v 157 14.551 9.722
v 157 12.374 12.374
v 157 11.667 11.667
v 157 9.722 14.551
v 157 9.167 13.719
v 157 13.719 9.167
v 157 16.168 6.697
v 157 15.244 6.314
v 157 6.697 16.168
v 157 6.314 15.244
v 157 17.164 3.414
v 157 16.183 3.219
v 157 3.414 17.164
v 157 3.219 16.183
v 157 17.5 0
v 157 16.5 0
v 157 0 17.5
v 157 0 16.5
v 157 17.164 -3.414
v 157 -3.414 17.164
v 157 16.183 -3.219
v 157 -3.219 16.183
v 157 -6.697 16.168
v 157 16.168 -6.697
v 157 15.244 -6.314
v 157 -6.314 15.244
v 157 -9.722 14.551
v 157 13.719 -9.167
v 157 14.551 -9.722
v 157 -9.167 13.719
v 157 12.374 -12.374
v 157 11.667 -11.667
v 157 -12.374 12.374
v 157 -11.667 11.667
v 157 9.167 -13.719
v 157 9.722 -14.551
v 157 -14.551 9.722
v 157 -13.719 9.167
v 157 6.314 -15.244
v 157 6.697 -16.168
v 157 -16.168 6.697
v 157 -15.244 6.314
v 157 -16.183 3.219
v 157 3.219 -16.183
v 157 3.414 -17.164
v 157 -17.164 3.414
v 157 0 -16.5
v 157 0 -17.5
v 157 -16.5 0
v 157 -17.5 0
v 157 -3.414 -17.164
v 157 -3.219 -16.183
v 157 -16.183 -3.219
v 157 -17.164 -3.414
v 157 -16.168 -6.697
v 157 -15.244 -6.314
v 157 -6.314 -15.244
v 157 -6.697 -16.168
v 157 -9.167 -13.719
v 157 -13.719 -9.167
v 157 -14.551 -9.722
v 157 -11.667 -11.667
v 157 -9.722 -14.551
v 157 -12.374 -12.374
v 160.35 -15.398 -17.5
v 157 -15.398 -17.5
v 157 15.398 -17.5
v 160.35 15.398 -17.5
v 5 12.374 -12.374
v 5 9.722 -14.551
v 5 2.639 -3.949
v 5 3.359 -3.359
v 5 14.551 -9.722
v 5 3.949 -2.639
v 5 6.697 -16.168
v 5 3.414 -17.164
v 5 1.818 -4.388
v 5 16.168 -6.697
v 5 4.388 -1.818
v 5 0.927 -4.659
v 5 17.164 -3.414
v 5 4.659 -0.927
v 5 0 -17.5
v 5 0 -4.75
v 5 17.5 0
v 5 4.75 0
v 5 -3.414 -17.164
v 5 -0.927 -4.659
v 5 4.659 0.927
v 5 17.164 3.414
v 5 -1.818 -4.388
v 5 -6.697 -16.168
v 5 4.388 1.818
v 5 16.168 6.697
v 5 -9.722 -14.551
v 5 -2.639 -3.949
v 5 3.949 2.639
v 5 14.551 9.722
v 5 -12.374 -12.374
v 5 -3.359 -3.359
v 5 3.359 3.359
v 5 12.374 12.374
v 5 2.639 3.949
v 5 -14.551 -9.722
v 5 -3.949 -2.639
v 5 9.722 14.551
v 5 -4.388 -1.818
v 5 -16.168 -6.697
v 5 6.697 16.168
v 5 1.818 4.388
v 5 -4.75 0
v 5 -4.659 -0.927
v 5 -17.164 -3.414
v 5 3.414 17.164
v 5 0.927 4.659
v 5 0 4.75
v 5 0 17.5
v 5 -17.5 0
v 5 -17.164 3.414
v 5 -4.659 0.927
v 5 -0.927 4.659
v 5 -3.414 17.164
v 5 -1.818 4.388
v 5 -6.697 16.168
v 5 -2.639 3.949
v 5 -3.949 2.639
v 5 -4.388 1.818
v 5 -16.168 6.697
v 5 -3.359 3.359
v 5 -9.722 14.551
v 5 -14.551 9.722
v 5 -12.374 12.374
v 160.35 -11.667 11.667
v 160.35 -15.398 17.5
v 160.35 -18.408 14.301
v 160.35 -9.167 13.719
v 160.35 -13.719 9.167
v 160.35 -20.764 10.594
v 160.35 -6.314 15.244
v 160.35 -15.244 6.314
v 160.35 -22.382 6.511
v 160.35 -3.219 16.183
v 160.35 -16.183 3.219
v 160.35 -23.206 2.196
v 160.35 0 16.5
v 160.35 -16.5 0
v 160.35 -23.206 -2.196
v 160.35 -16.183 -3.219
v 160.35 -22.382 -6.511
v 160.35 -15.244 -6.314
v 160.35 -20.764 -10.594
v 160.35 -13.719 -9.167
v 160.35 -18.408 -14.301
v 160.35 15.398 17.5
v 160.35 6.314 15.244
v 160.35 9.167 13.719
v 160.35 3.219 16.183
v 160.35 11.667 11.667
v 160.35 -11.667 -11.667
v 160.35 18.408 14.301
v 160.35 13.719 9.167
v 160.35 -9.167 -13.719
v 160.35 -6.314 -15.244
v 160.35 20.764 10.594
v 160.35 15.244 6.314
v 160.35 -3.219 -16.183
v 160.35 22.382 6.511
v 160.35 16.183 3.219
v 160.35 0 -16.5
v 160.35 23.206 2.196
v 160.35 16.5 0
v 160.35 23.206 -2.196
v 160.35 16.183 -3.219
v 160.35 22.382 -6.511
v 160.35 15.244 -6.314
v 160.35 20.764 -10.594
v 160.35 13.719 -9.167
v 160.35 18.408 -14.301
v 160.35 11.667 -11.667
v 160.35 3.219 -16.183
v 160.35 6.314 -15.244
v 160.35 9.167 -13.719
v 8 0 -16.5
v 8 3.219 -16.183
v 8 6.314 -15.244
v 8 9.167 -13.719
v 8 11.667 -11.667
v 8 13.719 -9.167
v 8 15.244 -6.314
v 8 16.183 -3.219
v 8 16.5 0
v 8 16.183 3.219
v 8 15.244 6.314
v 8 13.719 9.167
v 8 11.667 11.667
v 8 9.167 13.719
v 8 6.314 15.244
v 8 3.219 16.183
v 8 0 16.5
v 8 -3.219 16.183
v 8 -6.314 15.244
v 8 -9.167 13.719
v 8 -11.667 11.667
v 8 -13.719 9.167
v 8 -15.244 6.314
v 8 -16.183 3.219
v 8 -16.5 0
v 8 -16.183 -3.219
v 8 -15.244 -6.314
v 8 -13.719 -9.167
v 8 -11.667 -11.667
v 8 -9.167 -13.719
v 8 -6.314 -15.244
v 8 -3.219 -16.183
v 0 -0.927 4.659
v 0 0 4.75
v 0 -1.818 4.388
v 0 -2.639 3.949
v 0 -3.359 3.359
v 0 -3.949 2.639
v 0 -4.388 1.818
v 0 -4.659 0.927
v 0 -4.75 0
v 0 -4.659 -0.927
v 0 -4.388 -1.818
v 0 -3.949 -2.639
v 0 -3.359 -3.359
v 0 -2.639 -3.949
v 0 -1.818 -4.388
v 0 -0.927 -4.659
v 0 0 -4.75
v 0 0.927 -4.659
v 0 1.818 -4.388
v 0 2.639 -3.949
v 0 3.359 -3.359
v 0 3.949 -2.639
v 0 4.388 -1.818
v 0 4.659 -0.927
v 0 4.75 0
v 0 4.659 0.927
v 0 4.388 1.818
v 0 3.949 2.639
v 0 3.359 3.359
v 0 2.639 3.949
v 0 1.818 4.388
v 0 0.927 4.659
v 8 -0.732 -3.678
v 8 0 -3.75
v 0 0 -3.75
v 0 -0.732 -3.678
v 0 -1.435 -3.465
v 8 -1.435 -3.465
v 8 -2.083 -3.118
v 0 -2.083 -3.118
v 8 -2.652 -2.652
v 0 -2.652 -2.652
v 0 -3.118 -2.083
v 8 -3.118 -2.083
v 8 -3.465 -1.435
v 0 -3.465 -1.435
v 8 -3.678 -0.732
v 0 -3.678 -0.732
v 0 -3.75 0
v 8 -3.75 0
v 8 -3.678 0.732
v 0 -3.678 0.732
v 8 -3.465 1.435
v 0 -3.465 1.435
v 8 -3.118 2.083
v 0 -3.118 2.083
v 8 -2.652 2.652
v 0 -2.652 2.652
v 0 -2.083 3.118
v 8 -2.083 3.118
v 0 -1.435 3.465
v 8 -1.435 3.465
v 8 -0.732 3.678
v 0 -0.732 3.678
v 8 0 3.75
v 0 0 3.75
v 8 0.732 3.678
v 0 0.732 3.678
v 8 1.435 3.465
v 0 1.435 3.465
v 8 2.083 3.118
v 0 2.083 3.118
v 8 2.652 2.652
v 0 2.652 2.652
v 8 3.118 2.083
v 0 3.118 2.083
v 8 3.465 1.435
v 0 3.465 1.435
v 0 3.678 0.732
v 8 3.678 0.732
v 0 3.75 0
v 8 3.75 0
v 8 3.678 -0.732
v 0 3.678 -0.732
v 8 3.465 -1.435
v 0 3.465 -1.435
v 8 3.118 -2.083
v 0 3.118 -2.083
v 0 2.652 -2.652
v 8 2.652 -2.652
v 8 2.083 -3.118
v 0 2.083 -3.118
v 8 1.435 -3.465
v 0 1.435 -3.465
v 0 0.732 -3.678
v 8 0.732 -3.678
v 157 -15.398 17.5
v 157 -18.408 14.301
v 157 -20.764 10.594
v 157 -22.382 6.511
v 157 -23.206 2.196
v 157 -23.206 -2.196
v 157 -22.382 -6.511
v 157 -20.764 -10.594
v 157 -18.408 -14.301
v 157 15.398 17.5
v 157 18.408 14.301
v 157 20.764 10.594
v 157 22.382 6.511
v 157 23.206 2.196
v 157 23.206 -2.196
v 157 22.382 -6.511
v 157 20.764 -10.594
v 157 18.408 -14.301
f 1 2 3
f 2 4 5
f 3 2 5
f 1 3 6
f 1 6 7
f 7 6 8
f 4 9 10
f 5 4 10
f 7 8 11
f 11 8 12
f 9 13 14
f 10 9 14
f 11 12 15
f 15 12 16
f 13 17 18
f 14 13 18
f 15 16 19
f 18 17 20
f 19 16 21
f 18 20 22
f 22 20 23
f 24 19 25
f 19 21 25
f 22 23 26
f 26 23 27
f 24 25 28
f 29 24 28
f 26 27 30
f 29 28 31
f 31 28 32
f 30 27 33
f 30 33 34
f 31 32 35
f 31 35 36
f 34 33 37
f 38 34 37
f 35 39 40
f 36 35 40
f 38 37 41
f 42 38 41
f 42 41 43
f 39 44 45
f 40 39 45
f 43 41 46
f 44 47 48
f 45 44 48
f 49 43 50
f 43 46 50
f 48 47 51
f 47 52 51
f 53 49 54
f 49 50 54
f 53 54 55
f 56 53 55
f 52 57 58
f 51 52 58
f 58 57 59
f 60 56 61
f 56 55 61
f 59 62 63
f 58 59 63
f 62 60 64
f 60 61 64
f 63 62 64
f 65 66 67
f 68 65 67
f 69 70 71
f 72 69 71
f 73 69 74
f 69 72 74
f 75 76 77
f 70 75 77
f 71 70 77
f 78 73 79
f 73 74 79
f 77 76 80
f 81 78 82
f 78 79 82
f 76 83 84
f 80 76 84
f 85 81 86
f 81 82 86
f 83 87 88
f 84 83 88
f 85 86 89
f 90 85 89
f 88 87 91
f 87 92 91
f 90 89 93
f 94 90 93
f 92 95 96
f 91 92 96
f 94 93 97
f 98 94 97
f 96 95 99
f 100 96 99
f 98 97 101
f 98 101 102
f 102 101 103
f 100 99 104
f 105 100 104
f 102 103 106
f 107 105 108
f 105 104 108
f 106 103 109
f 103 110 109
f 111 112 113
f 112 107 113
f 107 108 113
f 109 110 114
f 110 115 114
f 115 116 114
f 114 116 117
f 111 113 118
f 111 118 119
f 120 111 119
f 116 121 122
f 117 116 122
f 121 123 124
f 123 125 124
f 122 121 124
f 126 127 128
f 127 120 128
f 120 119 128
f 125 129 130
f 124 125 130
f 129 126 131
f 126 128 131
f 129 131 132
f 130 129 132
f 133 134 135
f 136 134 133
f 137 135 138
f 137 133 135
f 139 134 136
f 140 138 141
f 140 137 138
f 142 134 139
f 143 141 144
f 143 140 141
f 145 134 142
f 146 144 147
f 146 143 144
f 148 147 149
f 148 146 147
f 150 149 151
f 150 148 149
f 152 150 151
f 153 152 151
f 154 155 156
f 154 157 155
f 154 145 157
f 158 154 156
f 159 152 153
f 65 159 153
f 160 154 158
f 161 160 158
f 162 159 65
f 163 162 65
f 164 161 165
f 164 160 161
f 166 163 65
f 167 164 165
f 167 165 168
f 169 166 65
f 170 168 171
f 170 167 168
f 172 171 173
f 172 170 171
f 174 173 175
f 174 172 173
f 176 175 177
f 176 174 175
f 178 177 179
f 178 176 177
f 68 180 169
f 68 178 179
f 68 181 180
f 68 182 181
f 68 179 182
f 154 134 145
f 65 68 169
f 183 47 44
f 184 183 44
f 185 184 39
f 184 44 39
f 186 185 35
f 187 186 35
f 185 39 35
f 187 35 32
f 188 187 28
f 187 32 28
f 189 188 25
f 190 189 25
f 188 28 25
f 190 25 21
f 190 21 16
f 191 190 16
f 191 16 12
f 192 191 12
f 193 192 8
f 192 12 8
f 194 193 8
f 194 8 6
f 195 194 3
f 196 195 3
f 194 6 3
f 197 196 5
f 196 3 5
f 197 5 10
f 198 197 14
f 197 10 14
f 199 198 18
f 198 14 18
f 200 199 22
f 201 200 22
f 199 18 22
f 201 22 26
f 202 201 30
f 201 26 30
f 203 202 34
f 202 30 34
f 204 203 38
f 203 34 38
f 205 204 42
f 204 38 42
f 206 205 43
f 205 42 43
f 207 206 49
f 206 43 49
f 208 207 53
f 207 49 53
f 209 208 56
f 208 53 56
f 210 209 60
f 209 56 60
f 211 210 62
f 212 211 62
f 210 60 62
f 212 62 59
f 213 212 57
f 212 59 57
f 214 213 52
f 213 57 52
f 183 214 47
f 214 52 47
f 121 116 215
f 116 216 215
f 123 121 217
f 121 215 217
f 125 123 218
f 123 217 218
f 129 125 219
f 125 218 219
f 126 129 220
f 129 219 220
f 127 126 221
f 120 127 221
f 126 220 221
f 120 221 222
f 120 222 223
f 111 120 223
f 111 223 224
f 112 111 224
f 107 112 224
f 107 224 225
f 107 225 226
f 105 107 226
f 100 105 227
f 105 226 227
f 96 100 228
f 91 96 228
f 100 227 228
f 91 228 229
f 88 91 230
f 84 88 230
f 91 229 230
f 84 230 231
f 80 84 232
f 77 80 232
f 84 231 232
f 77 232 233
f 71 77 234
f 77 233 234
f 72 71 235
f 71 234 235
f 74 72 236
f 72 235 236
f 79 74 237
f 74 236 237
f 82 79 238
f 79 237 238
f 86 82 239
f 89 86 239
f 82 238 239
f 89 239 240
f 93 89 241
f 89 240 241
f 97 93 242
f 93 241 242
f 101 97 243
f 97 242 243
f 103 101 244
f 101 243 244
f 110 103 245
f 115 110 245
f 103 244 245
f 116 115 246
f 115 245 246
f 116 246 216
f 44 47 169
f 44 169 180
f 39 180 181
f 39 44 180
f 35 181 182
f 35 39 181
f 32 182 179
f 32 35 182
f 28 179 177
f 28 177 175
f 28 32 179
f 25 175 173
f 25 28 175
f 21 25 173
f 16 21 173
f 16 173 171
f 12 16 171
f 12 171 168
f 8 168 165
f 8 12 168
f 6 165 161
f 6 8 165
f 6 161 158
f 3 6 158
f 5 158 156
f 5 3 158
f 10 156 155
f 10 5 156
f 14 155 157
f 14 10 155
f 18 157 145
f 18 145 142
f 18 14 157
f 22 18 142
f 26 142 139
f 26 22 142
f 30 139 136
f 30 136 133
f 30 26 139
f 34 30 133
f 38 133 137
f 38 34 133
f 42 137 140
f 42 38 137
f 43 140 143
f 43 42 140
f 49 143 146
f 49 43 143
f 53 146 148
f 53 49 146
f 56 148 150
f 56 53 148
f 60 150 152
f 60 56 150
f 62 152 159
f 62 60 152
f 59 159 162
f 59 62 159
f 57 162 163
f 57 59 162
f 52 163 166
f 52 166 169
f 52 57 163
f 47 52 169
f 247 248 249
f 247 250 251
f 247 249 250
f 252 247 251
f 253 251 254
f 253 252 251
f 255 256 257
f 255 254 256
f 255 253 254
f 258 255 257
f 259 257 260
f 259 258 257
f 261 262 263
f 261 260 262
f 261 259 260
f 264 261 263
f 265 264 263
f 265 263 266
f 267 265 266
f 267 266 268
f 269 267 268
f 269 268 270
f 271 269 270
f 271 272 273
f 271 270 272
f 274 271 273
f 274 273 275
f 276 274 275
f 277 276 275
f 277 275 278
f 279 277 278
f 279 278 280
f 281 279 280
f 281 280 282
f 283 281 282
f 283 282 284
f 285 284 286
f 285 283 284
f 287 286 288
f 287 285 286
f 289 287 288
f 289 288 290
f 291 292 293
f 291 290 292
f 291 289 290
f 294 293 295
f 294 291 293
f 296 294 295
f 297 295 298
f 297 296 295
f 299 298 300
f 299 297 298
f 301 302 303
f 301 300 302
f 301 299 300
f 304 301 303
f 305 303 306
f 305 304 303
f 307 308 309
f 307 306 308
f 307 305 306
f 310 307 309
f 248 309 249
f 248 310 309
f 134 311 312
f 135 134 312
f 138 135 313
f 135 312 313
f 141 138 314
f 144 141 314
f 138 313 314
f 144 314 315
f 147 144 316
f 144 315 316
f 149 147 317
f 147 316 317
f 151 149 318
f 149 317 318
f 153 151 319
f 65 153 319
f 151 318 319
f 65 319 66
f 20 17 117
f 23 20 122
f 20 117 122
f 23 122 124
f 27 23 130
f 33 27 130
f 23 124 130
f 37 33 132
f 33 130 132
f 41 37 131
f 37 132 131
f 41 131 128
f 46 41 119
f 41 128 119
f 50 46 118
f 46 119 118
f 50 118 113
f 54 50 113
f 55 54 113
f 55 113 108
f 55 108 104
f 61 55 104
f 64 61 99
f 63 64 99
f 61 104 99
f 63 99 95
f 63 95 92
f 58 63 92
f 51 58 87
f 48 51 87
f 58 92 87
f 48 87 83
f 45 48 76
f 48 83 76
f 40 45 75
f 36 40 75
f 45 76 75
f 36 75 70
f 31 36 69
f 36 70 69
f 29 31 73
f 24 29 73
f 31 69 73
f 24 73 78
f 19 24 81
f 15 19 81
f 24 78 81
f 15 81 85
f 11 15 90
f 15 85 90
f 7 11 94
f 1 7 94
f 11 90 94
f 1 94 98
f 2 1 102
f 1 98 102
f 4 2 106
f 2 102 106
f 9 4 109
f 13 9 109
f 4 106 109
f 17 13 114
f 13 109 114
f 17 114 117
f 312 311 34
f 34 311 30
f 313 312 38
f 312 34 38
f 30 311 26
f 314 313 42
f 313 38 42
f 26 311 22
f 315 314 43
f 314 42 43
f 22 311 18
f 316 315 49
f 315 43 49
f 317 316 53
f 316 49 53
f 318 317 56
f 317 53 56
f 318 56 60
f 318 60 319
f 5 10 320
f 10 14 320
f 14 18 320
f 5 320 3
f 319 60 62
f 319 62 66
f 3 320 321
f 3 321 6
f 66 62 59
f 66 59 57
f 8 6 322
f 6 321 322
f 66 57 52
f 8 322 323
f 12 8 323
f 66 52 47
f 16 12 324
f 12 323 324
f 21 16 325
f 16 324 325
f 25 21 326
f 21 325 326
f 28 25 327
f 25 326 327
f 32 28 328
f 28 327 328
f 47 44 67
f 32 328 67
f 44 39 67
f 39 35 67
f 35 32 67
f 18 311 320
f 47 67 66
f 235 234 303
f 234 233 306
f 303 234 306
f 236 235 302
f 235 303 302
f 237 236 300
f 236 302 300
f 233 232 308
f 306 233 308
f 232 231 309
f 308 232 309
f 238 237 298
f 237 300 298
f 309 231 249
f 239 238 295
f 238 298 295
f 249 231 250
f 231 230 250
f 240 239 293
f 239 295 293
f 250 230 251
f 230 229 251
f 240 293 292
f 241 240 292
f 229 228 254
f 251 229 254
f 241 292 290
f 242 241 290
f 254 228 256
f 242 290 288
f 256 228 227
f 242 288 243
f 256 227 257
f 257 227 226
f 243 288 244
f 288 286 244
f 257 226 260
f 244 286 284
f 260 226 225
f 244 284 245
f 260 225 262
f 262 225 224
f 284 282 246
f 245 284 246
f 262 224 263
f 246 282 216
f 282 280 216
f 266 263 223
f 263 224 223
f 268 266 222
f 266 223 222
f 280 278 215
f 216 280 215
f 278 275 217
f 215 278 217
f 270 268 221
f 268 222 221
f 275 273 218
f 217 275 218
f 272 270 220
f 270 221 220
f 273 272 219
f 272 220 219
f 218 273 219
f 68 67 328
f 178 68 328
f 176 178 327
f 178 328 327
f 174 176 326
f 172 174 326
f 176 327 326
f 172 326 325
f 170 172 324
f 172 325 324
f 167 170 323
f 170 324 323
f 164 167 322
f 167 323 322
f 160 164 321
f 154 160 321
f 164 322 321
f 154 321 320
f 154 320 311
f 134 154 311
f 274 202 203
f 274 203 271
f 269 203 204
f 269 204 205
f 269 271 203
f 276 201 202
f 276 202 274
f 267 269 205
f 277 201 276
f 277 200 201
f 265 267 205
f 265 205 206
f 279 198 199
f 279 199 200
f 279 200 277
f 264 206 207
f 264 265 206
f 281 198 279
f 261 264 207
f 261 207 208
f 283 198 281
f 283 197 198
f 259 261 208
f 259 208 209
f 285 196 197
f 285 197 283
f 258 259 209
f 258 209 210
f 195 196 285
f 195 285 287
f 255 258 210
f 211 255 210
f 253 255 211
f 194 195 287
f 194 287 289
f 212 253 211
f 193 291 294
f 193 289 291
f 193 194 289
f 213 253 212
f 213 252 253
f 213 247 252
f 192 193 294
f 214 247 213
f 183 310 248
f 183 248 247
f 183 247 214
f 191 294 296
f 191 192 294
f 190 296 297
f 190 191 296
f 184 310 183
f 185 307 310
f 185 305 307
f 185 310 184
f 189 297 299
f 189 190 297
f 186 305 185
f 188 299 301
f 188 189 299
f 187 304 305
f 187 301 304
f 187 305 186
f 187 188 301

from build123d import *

# Parameters (mm, degrees)
CUT_EXTRUDE1_DEPTH      = 45
CUT_EXTRUDE1_DEPTH_BACK = 260
SKETCH2_R               = 3.75
SKETCH3_R               = 16.5
CUT_EXTRUDE2_DEPTH      = 149
SKETCH4_R               = 16.5
BOSS_EXTRUDE1_DEPTH     = 3.35


with BuildPart() as part:
    # Sketch1 → Revolve2 (revolve)
    with BuildSketch(Plane.XY, mode=Mode.PRIVATE) as revolve2_sk:
        Polygon((0, 0), (157, 0), (157, 17.5), (5, 17.5), (5, 4.75), (0, 4.75), align=None)
    revolve(revolve2_sk.sketch.rotate(Axis((0, 0, 0), (1, 0, 0)), 90), axis=Axis((0, 0, 0), (1, 0, 0)))

    # Sketch2 → Cut-Extrude1 (cut, two sides: drawn at the far end of the back side and taken through both)
    with BuildSketch(Plane.ZY.offset(-CUT_EXTRUDE1_DEPTH_BACK)):
        with Locations(Location((0, 0, 0), (0, 0, 180))):
            Circle(SKETCH2_R)
    extrude(amount=CUT_EXTRUDE1_DEPTH + CUT_EXTRUDE1_DEPTH_BACK, mode=Mode.SUBTRACT)

    # Sketch3 → Cut-Extrude2 (cut)
    with BuildSketch(Plane(origin=(157, 0, 0), x_dir=(0, 0, -1), z_dir=(1, 0, 0))):
        Circle(SKETCH3_R)
    extrude(amount=-CUT_EXTRUDE2_DEPTH, mode=Mode.SUBTRACT)


with BuildPart() as body_2:
    # Sketch4 → Boss-Extrude1 (new body)
    with BuildSketch(Plane(origin=(157, 0, 0), x_dir=(0, 0, -1), z_dir=(1, 0, 0))):
        with BuildLine():
            Line((-17.5, 15.398249901), (-17.5, -15.398249901))
            ThreePointArc((-17.5, -15.398249901), (0, -23.31), (17.5, -15.398249901))
            Line((17.5, -15.398249901), (17.5, 15.398249901))
            ThreePointArc((17.5, 15.398249901), (0, 23.31), (-17.5, 15.398249901))
        make_face()
        Circle(SKETCH4_R, mode=Mode.SUBTRACT)
    extrude(amount=BOSS_EXTRUDE1_DEPTH)


solid = Compound([part.part, body_2.part])
